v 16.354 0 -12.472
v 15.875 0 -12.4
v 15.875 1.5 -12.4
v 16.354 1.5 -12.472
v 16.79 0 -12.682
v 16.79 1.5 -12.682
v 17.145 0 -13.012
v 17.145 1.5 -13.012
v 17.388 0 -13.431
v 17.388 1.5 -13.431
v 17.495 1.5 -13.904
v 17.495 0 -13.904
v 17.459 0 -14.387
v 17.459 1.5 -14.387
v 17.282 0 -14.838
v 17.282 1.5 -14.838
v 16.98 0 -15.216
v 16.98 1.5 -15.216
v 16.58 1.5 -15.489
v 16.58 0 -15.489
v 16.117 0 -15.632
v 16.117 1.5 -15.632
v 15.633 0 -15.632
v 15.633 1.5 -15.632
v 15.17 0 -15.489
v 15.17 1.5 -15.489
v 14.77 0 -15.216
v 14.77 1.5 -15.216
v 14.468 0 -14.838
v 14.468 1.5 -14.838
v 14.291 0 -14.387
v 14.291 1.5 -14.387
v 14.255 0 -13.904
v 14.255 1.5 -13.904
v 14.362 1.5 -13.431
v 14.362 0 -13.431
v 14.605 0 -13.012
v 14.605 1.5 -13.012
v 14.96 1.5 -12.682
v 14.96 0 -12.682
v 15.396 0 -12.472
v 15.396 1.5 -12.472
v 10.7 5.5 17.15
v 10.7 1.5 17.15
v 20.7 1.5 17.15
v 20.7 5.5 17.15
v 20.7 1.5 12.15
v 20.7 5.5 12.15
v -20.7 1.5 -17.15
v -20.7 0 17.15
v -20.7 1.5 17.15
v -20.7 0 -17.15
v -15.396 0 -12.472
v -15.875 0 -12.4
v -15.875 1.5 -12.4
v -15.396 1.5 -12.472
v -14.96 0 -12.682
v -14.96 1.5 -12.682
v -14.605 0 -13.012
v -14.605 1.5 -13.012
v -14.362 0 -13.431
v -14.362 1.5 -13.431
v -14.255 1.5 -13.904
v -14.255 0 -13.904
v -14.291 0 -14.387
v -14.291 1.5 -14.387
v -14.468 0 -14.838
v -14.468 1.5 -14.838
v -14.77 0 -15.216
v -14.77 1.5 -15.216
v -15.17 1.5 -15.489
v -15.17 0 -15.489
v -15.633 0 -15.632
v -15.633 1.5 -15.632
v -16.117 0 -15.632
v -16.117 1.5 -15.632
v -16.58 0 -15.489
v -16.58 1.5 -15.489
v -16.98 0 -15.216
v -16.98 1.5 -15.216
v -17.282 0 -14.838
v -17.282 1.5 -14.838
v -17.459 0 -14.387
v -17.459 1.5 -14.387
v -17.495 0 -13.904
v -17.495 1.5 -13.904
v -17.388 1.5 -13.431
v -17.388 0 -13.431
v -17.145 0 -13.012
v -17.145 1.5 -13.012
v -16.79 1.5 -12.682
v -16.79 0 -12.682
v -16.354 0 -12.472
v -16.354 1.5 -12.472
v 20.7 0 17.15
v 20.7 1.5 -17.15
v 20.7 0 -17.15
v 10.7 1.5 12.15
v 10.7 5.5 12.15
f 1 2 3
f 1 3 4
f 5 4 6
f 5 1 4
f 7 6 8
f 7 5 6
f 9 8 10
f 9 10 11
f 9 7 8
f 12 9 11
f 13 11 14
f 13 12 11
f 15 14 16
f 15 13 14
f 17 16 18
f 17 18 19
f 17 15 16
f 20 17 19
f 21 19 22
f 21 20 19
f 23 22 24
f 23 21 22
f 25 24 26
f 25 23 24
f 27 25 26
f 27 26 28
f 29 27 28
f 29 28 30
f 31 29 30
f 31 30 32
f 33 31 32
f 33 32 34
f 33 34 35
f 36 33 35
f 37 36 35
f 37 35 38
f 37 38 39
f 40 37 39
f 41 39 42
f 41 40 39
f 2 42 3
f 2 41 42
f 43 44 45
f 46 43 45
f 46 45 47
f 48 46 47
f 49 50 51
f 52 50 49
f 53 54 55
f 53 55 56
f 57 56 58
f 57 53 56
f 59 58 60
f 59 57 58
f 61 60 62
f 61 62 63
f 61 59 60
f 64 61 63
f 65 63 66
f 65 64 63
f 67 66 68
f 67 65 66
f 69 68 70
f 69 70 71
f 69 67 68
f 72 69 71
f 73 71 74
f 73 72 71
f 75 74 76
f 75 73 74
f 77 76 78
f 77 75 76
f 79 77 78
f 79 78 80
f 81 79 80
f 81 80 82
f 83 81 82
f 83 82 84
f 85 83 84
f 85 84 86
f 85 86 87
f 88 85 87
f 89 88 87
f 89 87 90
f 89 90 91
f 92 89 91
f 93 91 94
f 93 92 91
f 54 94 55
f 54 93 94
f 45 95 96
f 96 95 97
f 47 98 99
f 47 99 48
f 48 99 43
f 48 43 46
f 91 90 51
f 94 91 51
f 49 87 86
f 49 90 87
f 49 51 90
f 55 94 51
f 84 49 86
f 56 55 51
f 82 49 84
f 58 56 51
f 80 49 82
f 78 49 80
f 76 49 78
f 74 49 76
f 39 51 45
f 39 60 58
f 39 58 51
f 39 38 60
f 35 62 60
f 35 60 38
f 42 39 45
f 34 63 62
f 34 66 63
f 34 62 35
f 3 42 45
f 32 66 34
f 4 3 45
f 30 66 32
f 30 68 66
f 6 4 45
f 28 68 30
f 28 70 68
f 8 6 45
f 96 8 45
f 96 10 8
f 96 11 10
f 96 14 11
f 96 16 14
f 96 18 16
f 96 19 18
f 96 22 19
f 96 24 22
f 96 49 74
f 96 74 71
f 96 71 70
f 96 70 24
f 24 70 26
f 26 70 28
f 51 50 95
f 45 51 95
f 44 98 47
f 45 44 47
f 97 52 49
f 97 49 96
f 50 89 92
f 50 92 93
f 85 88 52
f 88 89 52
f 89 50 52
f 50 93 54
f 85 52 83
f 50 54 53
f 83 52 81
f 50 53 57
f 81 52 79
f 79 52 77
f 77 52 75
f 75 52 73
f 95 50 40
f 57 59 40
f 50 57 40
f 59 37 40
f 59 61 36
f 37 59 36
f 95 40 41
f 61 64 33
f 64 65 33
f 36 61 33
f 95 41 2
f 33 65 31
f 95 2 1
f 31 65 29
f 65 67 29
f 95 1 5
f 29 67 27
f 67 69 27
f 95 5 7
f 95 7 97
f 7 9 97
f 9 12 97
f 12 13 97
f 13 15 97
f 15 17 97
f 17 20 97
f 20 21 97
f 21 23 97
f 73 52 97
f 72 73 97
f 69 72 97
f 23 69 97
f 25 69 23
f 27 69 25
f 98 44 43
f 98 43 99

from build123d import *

# Parameters (mm, degrees)
SKICA1_W                = 41.4
SKICA1_H                = 34.3
SKICA1_R                = 1.625
P_IDAT_VYSUNUT_M1_DEPTH = 1.5
SKICA2_W                = 10
SKICA2_H                = 5
P_IDAT_VYSUNUT_M2_DEPTH = 4


with BuildPart() as part:
    # Skica1 → Přidat vysunutím1 (new body)
    with BuildSketch(Plane(origin=(0, 0, 0), x_dir=(1, 0, 0), z_dir=(0, 1, 0))):
        Rectangle(SKICA1_W, SKICA1_H)
        with Locations(Location((-15.875, 14.025, 0), (0, 0, 270))):
            Circle(SKICA1_R, mode=Mode.SUBTRACT)
        with Locations(Location((15.875, 14.025, 0), (0, 0, 270))):
            Circle(SKICA1_R, mode=Mode.SUBTRACT)
    extrude(amount=P_IDAT_VYSUNUT_M1_DEPTH)


with BuildPart() as body_2:
    # Skica2 → Přidat vysunutím2 (new body)
    with BuildSketch(Plane(origin=(0, 1.5, 0), x_dir=(1, 0, 0), z_dir=(0, 1, 0))):
        with Locations((15.7, -14.65)):
            Rectangle(SKICA2_W, SKICA2_H)
    extrude(amount=P_IDAT_VYSUNUT_M2_DEPTH)


solid = Compound([part.part, body_2.part])
